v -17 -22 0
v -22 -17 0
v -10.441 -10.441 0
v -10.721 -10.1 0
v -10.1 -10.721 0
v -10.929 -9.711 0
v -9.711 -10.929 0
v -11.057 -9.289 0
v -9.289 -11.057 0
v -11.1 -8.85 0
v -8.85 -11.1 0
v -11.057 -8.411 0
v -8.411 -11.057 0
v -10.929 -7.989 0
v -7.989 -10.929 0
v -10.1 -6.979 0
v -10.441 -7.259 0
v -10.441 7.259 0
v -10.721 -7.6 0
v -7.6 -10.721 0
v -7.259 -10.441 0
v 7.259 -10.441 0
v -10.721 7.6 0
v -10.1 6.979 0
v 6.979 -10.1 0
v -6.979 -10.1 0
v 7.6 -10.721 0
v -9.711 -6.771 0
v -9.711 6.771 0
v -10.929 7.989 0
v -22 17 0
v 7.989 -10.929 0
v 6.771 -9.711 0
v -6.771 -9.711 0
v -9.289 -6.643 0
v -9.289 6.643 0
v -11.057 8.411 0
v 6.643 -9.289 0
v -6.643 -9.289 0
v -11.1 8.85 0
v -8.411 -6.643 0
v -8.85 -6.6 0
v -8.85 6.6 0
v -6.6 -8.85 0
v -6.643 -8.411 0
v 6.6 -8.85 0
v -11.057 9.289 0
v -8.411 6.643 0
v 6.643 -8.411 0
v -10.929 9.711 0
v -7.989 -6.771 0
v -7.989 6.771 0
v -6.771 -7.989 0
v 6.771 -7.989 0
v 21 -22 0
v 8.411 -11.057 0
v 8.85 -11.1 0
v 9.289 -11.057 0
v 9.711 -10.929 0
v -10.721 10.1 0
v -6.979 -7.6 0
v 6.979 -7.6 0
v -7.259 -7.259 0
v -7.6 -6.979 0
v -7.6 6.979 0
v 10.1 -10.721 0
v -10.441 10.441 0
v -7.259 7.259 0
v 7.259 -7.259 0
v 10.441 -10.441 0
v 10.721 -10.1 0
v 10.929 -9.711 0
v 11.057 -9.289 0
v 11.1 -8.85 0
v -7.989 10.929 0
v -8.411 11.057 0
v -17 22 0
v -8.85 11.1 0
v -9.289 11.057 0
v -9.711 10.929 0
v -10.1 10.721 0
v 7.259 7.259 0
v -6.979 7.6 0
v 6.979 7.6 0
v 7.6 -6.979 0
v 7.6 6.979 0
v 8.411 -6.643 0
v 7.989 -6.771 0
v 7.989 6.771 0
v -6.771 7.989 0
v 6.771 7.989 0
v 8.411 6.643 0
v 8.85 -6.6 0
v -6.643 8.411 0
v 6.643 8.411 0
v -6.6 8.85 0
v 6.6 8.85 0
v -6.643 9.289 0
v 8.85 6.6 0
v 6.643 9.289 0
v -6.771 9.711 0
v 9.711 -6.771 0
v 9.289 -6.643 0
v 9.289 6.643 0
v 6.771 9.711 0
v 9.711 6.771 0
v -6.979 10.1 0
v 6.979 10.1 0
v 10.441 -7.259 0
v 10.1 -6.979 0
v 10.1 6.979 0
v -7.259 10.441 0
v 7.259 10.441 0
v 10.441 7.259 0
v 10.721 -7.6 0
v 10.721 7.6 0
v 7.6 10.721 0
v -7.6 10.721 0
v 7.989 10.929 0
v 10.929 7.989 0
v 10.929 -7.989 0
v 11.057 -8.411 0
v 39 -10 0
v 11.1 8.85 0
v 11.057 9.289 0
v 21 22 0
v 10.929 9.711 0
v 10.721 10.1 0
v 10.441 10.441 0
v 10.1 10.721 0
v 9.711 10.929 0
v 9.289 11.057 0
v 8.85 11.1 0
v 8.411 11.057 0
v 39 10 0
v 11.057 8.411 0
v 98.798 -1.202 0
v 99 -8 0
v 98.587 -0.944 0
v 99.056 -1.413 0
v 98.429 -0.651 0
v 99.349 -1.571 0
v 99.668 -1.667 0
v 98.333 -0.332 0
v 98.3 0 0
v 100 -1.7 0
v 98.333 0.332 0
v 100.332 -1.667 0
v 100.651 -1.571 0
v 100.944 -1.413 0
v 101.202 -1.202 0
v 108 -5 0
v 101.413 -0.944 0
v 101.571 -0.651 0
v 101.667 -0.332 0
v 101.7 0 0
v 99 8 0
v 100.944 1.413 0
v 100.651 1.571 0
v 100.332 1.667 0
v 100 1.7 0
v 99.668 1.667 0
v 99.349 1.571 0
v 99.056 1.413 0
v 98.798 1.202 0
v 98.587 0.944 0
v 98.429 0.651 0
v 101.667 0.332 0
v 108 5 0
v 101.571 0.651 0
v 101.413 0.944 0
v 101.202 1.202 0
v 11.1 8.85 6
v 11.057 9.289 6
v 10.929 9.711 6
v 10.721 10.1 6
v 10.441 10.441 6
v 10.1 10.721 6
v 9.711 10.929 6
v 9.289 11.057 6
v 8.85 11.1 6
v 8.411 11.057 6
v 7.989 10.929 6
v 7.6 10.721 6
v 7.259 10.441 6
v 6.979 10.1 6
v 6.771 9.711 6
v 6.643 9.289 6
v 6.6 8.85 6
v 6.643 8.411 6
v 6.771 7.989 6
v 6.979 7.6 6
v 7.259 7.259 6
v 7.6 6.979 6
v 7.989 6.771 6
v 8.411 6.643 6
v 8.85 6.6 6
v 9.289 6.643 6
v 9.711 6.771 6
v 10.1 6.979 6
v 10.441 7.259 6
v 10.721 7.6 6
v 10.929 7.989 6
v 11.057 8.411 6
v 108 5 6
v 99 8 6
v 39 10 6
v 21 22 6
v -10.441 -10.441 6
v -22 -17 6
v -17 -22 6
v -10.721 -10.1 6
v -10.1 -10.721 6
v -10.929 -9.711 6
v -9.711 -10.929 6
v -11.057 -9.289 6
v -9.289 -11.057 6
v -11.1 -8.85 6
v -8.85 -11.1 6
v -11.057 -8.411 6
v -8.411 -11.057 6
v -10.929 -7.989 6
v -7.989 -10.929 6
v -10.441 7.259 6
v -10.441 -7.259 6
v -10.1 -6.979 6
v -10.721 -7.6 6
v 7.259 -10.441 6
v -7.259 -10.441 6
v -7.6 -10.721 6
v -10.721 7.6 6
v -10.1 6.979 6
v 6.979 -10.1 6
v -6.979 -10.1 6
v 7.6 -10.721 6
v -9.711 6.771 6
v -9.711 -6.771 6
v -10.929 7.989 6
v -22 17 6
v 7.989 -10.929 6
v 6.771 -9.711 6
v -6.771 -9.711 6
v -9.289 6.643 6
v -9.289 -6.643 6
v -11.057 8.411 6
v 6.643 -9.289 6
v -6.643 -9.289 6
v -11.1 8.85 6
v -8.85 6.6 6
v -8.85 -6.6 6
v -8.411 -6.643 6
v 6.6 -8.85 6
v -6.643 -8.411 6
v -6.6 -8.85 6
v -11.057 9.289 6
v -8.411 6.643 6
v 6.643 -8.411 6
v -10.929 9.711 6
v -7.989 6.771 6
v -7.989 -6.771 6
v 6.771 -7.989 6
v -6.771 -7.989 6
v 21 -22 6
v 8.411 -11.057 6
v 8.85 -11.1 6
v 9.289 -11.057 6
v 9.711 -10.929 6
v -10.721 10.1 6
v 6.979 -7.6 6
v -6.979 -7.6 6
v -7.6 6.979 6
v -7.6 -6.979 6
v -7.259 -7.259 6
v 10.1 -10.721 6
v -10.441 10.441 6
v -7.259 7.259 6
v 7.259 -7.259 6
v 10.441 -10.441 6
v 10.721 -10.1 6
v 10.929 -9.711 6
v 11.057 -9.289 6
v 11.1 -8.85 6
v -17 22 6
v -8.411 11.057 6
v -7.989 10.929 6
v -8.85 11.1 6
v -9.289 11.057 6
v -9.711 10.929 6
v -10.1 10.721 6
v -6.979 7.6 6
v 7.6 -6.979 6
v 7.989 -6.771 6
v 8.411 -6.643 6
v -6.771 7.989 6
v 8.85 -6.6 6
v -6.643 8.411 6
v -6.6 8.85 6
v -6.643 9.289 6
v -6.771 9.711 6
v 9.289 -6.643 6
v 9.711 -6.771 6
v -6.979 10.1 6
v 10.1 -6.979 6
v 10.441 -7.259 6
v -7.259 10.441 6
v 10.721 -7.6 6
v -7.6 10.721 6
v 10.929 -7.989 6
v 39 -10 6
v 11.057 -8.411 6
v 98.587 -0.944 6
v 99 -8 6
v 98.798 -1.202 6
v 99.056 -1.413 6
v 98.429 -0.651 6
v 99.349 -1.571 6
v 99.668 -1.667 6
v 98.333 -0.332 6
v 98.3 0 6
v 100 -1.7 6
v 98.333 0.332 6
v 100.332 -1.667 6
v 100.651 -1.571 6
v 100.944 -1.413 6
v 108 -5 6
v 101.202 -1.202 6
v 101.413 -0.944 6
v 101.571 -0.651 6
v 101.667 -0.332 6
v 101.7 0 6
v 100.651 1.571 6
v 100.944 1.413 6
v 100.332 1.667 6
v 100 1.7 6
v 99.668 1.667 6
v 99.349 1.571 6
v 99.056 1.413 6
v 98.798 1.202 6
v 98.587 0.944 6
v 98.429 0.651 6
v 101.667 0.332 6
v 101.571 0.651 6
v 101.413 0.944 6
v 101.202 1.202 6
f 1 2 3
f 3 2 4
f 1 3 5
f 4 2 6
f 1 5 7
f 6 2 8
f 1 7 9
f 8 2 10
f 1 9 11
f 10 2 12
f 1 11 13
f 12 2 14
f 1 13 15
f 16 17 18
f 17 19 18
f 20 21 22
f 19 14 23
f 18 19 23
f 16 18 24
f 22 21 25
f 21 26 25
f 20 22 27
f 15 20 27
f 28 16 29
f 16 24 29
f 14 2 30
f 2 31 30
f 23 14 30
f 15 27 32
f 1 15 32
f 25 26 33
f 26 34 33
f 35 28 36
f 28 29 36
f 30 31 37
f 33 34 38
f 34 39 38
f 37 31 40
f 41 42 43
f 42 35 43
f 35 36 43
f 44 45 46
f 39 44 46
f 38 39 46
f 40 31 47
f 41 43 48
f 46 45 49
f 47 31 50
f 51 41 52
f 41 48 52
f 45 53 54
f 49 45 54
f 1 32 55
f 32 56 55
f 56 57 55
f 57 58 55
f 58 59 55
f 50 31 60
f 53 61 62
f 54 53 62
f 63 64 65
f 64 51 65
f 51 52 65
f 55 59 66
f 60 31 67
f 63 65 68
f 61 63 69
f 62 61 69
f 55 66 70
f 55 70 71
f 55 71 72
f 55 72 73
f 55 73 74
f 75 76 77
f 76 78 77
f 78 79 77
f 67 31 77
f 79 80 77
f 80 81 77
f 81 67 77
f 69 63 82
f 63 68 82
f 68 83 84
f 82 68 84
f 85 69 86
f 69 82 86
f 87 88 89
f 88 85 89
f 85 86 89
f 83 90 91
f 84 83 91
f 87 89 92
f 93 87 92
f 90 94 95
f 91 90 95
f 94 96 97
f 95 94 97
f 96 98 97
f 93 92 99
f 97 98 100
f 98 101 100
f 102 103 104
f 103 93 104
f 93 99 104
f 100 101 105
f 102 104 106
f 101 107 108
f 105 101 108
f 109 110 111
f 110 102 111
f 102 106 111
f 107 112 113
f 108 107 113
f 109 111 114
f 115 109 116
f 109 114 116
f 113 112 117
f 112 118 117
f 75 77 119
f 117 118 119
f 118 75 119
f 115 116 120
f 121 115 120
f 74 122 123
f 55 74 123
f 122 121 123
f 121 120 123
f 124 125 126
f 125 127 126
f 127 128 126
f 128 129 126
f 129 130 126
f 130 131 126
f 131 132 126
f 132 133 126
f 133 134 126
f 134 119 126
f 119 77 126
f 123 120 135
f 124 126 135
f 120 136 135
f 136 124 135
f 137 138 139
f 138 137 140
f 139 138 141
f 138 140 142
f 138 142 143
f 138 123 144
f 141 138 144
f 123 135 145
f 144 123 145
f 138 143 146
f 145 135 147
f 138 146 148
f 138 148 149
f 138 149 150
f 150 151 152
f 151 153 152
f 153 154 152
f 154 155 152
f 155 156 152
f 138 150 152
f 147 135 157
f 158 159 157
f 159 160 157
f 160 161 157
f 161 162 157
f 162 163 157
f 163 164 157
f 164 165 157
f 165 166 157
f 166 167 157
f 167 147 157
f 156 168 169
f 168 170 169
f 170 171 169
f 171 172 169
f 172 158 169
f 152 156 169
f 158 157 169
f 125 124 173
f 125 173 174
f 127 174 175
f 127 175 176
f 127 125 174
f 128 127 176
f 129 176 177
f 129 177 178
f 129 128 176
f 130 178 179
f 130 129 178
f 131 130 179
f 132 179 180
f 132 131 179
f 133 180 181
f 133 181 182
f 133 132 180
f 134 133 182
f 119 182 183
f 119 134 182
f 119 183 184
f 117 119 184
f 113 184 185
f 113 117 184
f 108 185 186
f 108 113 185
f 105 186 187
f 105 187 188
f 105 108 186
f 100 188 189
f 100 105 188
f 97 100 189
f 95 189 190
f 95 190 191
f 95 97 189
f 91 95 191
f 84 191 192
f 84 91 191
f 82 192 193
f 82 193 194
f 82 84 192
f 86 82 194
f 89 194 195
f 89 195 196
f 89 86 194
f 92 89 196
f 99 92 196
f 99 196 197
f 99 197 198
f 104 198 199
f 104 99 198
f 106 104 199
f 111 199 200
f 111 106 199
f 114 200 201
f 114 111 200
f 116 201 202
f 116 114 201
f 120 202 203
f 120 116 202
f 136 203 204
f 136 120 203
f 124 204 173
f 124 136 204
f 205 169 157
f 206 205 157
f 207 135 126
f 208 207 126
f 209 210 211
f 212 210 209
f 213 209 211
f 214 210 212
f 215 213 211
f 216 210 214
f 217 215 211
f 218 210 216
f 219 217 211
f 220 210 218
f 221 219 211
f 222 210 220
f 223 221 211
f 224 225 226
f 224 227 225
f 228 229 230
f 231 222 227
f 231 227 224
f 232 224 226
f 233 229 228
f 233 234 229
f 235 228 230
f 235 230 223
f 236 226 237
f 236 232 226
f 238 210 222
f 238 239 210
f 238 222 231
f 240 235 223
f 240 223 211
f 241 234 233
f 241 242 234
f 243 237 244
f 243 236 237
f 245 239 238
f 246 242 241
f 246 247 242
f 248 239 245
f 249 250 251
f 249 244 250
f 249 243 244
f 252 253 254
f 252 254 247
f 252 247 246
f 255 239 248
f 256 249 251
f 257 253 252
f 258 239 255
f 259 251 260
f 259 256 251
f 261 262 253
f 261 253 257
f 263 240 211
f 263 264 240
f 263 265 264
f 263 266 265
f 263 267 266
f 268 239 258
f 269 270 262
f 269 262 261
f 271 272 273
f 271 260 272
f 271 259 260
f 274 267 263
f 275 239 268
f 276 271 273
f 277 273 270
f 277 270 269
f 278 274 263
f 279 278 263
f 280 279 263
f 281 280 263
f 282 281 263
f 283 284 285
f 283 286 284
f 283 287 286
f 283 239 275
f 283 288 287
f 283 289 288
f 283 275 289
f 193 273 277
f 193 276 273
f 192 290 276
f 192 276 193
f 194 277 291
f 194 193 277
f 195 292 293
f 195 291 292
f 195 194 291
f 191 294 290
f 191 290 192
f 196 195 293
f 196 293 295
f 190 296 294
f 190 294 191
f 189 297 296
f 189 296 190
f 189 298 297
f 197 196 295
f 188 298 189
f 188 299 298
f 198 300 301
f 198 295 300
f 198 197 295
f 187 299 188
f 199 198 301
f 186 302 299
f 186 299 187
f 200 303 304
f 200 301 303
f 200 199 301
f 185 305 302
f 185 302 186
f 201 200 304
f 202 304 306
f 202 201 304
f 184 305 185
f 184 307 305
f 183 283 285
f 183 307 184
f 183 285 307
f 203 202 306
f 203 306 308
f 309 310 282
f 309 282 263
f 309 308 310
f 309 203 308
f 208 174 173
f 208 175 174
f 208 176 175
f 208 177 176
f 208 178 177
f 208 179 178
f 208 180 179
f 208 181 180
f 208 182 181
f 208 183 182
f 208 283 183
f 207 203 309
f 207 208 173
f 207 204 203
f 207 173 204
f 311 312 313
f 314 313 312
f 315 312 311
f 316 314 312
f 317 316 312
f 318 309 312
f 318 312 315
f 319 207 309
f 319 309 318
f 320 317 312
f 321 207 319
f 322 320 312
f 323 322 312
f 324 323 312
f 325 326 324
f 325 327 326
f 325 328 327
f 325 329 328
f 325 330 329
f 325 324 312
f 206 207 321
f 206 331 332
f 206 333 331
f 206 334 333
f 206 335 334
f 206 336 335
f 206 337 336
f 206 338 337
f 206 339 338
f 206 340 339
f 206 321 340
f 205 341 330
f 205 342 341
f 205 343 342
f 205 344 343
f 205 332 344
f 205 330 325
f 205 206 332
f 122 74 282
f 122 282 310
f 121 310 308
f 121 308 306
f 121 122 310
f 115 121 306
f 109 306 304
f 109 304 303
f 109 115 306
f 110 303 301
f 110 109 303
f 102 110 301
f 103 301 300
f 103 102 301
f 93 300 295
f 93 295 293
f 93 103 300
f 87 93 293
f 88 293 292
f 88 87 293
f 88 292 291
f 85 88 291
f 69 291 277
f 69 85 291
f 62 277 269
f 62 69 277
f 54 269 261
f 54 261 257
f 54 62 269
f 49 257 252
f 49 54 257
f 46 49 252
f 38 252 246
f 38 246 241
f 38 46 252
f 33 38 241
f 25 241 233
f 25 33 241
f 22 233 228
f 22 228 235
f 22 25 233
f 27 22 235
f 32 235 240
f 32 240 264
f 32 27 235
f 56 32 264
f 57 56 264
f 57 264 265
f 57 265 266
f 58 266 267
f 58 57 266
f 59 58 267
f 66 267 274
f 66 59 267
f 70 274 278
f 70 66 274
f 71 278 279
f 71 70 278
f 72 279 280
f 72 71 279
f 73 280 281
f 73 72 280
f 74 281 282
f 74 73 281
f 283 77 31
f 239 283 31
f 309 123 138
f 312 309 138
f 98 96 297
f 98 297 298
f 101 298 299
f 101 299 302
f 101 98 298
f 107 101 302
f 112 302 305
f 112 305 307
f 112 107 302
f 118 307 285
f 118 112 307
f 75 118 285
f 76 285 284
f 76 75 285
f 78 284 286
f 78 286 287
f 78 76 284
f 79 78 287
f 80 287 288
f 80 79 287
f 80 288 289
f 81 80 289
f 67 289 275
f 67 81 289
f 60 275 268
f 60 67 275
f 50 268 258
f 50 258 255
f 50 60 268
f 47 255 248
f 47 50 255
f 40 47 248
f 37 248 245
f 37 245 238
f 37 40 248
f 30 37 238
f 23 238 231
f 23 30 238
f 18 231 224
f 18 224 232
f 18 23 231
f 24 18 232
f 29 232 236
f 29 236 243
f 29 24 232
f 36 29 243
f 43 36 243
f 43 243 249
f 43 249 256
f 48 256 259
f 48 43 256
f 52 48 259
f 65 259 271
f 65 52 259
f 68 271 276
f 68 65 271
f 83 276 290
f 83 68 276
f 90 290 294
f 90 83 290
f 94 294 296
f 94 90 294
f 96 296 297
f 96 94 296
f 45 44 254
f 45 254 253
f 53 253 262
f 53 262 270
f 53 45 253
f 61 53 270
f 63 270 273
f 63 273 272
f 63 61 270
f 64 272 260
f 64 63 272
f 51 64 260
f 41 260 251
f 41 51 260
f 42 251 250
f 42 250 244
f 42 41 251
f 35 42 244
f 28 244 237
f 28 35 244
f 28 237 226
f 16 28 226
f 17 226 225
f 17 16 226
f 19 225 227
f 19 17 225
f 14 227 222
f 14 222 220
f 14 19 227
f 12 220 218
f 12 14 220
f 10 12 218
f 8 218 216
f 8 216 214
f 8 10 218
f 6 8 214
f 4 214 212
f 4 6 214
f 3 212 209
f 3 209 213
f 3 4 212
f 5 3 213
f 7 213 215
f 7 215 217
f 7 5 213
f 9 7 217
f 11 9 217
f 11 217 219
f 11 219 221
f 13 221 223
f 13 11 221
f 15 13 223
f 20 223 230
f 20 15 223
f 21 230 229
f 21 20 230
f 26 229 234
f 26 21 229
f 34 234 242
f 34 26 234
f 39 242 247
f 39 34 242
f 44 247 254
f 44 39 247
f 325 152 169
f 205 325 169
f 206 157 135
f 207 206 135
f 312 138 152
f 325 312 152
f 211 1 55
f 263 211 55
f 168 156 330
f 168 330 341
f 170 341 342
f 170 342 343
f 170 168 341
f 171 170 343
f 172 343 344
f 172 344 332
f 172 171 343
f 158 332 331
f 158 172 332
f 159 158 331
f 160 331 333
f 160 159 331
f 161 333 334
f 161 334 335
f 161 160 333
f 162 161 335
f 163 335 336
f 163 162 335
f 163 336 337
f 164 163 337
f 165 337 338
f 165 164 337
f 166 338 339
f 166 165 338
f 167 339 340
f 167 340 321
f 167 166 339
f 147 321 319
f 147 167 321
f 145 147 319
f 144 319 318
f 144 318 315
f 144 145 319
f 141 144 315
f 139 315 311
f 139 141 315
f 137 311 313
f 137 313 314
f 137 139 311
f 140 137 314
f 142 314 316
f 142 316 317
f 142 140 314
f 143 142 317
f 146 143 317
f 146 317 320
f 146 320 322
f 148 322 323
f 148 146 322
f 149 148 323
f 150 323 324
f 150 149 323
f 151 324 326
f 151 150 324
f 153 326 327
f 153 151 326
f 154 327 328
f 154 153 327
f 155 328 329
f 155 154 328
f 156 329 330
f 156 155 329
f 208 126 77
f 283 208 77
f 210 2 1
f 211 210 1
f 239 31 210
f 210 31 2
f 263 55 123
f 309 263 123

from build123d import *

# Parameters (mm, degrees)
SKETCH_1_R        = 2.25
SKETCH_1_R_2      = 1.7
EXTRUDE_237_DEPTH = 6


with BuildPart() as part:
    # 草图1 → Extrude 237 (new body)
    with BuildSketch(Plane.XY):
        Polygon((-22, -17), (-17, -22), (21, -22), (39, -10), (99, -8), (108, -5), (108, 5), (99, 8), (39, 10), (21, 22), (-17, 22), (-22, 17), align=None)
        with Locations((-8.85, -8.85)):
            Circle(SKETCH_1_R, mode=Mode.SUBTRACT)
        with Locations((-8.85, 8.85)):
            Circle(SKETCH_1_R, mode=Mode.SUBTRACT)
        with Locations((8.85, -8.85)):
            Circle(SKETCH_1_R, mode=Mode.SUBTRACT)
        with Locations((8.85, 8.85)):
            Circle(SKETCH_1_R, mode=Mode.SUBTRACT)
        with Locations((100, 0)):
            Circle(SKETCH_1_R_2, mode=Mode.SUBTRACT)
    extrude(amount=EXTRUDE_237_DEPTH)


solid = part.part
